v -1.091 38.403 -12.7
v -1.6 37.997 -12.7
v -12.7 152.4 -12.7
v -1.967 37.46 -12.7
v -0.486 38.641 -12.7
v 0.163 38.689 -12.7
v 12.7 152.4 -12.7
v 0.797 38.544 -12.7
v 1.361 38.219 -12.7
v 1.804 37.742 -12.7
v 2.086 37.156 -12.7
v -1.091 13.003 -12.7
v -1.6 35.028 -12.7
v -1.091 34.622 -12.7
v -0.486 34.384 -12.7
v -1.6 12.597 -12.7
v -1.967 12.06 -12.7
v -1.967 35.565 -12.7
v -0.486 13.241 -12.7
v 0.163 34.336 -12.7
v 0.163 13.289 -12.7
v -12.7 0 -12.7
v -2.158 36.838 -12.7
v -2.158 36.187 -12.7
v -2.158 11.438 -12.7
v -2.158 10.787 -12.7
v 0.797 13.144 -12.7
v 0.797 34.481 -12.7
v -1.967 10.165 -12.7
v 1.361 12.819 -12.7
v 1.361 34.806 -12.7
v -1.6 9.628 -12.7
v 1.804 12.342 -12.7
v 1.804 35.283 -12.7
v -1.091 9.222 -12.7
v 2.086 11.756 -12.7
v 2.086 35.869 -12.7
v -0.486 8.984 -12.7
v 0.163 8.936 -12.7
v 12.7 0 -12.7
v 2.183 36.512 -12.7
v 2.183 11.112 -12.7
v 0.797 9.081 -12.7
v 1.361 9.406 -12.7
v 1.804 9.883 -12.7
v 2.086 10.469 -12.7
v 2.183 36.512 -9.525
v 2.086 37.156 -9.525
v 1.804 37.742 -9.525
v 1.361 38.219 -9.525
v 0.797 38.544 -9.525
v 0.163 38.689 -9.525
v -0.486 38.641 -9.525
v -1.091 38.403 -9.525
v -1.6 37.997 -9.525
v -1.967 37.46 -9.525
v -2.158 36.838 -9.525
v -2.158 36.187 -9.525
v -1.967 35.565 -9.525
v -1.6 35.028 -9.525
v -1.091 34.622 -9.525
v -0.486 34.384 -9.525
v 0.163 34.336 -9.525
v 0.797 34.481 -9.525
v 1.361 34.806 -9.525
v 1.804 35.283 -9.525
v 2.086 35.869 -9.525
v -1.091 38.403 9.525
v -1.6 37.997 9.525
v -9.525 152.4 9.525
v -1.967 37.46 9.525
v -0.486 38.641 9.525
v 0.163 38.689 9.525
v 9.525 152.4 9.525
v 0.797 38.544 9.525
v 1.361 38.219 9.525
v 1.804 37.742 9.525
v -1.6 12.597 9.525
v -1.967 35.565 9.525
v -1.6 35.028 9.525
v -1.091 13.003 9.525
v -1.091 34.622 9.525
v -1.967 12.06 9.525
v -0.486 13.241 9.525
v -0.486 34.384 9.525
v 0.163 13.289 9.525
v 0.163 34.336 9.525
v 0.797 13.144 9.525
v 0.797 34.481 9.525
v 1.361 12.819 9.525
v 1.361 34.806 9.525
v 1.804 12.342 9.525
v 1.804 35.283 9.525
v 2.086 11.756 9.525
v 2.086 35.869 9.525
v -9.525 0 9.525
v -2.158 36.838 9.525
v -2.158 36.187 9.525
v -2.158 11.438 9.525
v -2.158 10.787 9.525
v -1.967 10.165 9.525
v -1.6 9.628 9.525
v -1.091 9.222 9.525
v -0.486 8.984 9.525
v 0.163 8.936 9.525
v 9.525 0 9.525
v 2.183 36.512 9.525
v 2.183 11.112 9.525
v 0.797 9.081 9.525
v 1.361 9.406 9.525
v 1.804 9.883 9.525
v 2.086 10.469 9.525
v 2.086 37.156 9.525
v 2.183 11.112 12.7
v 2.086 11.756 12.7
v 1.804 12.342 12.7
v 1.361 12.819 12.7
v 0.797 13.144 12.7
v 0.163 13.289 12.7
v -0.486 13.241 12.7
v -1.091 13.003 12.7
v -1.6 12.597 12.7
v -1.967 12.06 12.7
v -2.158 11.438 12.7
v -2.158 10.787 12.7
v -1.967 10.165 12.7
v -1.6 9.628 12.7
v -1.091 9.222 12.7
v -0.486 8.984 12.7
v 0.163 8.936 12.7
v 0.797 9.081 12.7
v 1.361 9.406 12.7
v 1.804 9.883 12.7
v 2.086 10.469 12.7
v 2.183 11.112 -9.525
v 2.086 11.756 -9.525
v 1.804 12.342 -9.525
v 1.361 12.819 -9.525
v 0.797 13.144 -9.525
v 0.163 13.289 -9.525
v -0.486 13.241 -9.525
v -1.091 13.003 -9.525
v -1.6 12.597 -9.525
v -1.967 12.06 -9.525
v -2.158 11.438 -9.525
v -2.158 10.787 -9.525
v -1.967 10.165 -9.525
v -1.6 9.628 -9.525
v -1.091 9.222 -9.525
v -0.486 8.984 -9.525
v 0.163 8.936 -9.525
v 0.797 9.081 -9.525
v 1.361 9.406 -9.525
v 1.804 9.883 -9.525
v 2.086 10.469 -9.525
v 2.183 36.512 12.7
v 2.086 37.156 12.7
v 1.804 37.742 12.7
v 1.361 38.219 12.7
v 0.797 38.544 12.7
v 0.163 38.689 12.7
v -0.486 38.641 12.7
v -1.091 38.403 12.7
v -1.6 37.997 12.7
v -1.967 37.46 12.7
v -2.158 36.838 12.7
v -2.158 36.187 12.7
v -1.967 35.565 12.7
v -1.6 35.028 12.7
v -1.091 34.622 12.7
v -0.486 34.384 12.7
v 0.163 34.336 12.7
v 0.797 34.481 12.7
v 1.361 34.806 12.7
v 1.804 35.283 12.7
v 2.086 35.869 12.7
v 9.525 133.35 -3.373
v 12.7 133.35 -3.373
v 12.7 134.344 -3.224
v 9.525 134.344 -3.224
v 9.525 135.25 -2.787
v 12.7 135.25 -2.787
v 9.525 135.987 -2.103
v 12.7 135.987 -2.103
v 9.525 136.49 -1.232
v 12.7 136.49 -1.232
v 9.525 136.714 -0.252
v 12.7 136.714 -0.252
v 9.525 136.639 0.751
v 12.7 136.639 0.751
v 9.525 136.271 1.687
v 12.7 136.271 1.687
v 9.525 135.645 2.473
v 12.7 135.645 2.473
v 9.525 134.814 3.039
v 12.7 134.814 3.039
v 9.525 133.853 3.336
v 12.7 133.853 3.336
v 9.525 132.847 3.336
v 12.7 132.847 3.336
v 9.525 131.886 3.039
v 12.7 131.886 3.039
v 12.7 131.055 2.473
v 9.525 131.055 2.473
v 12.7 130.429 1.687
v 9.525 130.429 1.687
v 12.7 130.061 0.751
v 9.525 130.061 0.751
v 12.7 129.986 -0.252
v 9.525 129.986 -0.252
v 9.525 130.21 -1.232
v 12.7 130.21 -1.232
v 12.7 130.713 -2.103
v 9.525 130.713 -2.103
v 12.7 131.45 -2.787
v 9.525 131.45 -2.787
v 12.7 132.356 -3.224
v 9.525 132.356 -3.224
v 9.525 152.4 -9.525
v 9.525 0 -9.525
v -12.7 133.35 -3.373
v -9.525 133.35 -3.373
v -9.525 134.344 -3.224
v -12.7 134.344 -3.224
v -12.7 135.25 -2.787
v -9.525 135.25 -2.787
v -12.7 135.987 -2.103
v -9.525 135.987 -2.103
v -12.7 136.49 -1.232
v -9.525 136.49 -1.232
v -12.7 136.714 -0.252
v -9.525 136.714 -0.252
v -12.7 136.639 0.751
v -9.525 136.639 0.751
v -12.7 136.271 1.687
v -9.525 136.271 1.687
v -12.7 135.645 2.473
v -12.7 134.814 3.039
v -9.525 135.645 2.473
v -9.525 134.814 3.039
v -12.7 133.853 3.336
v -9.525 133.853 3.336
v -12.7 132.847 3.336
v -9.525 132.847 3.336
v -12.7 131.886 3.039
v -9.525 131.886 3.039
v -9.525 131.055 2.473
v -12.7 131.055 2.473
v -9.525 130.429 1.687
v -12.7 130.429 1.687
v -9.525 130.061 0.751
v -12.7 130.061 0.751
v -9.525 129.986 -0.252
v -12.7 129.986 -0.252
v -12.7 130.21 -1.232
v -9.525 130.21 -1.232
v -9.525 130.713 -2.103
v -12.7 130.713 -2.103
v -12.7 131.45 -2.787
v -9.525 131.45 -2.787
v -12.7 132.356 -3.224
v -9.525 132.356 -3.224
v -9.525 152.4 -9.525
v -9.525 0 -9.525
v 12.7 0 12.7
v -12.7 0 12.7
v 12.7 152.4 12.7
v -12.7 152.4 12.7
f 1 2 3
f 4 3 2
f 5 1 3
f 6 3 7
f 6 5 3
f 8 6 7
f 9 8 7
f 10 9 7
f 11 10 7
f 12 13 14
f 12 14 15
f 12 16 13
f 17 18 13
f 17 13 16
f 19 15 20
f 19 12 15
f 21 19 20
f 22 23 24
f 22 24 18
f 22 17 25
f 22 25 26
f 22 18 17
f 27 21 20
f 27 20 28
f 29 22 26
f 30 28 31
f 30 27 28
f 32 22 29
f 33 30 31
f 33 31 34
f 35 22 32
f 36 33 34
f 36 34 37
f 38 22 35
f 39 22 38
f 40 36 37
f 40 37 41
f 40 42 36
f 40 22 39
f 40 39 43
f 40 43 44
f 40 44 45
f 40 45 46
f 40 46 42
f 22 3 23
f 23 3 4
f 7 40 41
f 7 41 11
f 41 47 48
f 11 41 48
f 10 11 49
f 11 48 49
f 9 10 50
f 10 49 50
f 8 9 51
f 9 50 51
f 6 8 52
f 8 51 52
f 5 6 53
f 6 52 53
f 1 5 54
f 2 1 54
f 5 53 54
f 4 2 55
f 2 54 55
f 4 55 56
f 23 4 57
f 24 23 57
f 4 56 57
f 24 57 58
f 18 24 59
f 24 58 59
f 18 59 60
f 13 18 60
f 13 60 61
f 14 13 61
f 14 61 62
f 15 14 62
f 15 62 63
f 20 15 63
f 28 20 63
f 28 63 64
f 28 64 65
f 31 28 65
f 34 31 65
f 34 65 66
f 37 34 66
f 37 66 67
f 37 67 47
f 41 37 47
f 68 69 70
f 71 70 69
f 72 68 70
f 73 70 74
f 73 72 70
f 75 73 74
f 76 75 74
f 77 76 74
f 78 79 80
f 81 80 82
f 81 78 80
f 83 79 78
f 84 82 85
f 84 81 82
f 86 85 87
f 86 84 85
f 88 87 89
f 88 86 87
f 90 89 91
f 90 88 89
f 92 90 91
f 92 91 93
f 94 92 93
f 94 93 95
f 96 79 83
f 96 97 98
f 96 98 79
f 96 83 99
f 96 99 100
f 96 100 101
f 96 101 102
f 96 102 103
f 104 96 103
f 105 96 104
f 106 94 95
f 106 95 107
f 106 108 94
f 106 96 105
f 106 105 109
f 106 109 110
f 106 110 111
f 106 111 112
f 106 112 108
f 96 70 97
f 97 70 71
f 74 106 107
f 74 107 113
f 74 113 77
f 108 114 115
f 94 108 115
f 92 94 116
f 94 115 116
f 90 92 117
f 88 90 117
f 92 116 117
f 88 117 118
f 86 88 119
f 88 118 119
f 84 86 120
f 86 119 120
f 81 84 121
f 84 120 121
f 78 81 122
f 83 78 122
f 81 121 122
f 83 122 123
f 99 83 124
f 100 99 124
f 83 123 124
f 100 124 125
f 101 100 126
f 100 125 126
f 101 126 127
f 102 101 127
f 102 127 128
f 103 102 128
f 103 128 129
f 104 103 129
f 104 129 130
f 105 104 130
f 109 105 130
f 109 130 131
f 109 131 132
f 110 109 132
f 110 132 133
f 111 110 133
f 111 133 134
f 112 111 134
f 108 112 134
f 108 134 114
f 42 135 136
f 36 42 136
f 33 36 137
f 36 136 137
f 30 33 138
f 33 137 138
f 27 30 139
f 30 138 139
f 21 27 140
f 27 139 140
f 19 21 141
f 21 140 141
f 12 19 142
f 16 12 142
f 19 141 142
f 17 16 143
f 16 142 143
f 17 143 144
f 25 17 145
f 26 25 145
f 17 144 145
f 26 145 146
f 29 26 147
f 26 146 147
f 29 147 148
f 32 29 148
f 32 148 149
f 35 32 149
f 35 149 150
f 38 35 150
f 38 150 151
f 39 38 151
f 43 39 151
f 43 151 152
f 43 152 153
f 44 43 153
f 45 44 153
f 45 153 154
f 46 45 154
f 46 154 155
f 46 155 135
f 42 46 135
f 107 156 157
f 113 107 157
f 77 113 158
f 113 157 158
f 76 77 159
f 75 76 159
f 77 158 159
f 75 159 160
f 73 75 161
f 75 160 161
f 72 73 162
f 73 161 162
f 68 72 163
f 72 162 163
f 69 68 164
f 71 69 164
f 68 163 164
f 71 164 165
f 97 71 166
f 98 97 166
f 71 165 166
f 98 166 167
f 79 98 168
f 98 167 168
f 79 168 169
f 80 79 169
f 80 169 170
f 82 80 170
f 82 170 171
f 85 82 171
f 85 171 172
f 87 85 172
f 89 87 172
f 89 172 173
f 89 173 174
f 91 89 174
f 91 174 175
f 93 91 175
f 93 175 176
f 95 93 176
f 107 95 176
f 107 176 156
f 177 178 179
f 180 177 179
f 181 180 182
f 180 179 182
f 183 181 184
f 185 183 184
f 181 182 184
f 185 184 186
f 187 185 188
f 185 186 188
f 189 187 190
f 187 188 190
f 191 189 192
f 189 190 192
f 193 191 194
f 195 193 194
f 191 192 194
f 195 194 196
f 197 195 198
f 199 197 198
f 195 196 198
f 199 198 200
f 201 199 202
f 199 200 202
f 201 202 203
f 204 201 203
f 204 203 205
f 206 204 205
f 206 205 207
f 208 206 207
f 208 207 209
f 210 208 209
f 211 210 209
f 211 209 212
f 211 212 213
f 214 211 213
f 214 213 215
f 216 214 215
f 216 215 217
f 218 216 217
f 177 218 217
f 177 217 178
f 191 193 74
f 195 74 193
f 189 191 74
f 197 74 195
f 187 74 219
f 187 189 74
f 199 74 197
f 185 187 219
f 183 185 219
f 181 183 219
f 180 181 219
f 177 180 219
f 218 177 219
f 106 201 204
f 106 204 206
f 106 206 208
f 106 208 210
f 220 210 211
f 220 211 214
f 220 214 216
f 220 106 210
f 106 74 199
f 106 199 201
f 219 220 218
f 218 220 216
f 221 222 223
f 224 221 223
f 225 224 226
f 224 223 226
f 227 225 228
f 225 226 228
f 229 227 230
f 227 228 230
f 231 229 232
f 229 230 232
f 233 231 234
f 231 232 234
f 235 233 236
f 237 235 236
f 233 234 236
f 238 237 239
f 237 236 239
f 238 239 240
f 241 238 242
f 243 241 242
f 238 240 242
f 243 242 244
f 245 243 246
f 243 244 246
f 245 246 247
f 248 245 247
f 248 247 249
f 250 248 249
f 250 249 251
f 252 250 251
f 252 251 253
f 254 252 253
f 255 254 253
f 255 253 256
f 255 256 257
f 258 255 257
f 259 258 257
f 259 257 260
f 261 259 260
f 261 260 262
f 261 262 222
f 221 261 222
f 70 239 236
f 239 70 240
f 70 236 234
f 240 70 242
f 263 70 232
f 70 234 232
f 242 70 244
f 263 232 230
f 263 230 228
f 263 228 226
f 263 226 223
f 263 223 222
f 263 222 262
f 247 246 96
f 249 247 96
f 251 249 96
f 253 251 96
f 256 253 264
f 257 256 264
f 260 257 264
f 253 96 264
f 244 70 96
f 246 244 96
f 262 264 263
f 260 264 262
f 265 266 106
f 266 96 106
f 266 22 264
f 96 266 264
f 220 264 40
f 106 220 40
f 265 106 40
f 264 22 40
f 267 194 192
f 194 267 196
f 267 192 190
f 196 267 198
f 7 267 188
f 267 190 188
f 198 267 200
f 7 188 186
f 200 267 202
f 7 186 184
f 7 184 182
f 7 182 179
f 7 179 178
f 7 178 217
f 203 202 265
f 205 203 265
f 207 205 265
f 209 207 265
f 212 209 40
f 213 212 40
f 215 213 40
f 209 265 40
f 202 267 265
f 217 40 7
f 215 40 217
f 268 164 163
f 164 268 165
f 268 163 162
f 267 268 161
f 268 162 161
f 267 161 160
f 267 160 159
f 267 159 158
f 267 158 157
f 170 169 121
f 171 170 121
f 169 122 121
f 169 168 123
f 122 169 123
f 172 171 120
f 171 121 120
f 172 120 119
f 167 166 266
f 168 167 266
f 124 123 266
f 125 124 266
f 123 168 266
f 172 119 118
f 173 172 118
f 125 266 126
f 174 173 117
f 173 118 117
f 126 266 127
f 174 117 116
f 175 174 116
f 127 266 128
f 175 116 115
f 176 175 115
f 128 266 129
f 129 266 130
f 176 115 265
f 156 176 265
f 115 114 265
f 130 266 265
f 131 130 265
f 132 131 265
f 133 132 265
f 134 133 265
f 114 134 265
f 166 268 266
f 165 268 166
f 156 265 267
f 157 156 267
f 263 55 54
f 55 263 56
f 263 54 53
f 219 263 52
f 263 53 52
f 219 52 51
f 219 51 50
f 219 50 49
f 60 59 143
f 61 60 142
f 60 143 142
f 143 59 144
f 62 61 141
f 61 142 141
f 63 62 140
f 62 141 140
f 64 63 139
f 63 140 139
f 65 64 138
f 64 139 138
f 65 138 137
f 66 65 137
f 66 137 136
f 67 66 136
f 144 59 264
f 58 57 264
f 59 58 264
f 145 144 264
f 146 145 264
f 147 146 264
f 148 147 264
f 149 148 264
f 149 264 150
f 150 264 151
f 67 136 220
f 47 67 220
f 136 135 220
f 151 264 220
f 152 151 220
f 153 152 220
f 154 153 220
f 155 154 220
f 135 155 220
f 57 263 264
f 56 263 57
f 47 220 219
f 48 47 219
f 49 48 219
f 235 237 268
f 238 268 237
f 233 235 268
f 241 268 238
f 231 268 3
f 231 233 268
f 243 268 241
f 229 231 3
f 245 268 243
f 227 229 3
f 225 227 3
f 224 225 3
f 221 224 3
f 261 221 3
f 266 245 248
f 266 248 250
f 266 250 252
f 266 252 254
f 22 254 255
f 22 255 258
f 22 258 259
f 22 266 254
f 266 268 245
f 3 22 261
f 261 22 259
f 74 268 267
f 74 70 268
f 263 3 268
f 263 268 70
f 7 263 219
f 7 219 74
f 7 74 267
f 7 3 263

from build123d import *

# Parameters (mm, degrees)
SKETCH1_W           = 25.4
SKETCH1_H           = 25.4
SKETCH1_W_2         = 19.05
SKETCH1_H_2         = 19.05
BOSS_EXTRUDE1_DEPTH = 152.4
SKETCH2_R           = 2.1828125
CUT_EXTRUDE1_DEPTH  = 156.02325632
SKETCH3_R           = 3.3734375
CUT_EXTRUDE2_DEPTH  = 154.94


with BuildPart() as part:
    # Sketch1 → Boss-Extrude1 (new body)
    with BuildSketch(Plane(origin=(0, 0, 0), x_dir=(1, 0, 0), z_dir=(0, 1, 0))):
        Rectangle(SKETCH1_W, SKETCH1_H)
        Rectangle(SKETCH1_W_2, SKETCH1_H_2, mode=Mode.SUBTRACT)
    extrude(amount=BOSS_EXTRUDE1_DEPTH)

    # Sketch2 → Cut-Extrude1 (cut, through all)
    with BuildSketch(Plane.XY.offset(12.7)):
        with Locations((0, 11.1125)):
            Circle(SKETCH2_R)
        with Locations((0, 36.5125)):
            Circle(SKETCH2_R)
    extrude(amount=-CUT_EXTRUDE1_DEPTH, mode=Mode.SUBTRACT)

    # Sketch3 → Cut-Extrude2 (cut)
    with BuildSketch(Plane(origin=(12.7, 0, 0), x_dir=(0, 0, -1), z_dir=(1, 0, 0))):
        with Locations((0, 133.35)):
            Circle(SKETCH3_R)
    extrude(amount=-CUT_EXTRUDE2_DEPTH, mode=Mode.SUBTRACT)


solid = part.part
